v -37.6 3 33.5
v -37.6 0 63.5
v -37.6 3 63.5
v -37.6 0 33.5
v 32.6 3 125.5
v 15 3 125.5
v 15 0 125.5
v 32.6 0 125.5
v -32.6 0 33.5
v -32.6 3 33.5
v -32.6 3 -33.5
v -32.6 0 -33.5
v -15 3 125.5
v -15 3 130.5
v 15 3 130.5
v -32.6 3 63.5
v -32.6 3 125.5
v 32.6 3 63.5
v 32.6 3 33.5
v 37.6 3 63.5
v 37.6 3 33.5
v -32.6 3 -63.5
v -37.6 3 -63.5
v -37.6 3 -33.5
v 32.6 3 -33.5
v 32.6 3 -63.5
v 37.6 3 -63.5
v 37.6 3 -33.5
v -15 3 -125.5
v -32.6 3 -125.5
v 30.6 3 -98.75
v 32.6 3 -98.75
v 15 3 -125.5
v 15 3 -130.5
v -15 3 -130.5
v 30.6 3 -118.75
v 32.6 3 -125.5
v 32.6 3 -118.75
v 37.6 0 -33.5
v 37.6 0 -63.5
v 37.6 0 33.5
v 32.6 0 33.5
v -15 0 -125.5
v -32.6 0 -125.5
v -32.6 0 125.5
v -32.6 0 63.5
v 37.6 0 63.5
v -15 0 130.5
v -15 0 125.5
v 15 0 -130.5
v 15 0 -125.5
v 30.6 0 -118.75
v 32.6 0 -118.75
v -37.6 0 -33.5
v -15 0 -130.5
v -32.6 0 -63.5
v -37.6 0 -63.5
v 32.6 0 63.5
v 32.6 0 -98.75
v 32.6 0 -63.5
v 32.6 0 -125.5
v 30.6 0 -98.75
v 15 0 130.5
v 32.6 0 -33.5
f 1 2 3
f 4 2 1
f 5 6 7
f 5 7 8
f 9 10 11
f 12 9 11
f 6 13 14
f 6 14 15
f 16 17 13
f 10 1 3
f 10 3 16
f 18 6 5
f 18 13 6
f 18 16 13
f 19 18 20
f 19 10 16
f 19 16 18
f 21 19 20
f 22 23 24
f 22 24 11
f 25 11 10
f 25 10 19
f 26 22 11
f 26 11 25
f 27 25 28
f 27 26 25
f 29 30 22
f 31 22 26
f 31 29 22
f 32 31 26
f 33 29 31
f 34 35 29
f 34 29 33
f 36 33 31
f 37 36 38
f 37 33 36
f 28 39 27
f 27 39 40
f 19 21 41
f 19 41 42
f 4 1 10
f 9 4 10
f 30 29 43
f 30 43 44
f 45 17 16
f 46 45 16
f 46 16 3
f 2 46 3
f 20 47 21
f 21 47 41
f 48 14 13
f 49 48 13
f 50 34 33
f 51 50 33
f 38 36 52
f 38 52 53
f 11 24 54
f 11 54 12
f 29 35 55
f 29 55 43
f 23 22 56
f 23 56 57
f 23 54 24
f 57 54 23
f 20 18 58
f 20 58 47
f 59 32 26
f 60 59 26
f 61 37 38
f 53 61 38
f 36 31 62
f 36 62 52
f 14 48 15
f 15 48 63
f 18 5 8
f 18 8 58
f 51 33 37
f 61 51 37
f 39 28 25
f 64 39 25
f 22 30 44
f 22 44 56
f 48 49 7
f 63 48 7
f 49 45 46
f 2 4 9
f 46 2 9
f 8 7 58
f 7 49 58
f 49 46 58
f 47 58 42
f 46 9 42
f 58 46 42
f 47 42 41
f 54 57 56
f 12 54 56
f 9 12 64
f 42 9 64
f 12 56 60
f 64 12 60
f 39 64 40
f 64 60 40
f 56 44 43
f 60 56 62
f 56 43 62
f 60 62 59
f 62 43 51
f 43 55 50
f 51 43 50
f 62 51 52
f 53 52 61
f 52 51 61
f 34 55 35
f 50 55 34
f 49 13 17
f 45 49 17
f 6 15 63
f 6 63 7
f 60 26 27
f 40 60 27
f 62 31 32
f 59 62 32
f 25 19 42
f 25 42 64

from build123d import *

# Parameters (mm, degrees)
SKETCH1_W           = 75.2
SKETCH1_H           = 261
BOSS_EXTRUDE1_DEPTH = 3
SKETCH2_W           = 5
SKETCH2_H           = 67
CUT_EXTRUDE1_DEPTH  = 136.841856583
SKETCH3_W           = 2
SKETCH3_H           = 20
CUT_EXTRUDE2_DEPTH  = 136.841856583


with BuildPart() as part:
    # Sketch1 → Boss-Extrude1 (new body)
    with BuildSketch(Plane(origin=(0, 0, 0), x_dir=(1, 0, 0), z_dir=(0, 1, 0))):
        Rectangle(SKETCH1_W, SKETCH1_H)
    extrude(amount=BOSS_EXTRUDE1_DEPTH)

    # Sketch2 → Cut-Extrude1 (cut, through all)
    with BuildSketch(Plane(origin=(0, 3, 0), x_dir=(1, 0, 0), z_dir=(0, 1, 0))):
        Polygon((-37.6, -130.5), (-15, -130.5), (-15, -125.5), (-32.6, -125.5), (-32.6, -63.5), (-37.6, -63.5), align=None)
        with Locations((-35.1, 0)):
            Rectangle(SKETCH2_W, SKETCH2_H)
        Polygon((-37.6, 130.5), (-15, 130.5), (-15, 125.5), (-32.6, 125.5), (-32.6, 63.5), (-37.6, 63.5), align=None)
    cut_extrude1 = extrude(amount=-CUT_EXTRUDE1_DEPTH, mode=Mode.SUBTRACT)

    # Mirror1: Cut-Extrude1 across plane
    add(cut_extrude1.mirror(Plane(origin=(0, 0, 0), x_dir=(0, 0, 1), z_dir=(1, 0, 0))), mode=Mode.SUBTRACT)

    # Sketch3 → Cut-Extrude2 (cut, through all)
    with BuildSketch(Plane(origin=(0, 3, 0), x_dir=(1, 0, 0), z_dir=(0, 1, 0))):
        with Locations((31.6, 108.75)):
            Rectangle(SKETCH3_W, SKETCH3_H)
    extrude(amount=-CUT_EXTRUDE2_DEPTH, mode=Mode.SUBTRACT)


solid = part.part
